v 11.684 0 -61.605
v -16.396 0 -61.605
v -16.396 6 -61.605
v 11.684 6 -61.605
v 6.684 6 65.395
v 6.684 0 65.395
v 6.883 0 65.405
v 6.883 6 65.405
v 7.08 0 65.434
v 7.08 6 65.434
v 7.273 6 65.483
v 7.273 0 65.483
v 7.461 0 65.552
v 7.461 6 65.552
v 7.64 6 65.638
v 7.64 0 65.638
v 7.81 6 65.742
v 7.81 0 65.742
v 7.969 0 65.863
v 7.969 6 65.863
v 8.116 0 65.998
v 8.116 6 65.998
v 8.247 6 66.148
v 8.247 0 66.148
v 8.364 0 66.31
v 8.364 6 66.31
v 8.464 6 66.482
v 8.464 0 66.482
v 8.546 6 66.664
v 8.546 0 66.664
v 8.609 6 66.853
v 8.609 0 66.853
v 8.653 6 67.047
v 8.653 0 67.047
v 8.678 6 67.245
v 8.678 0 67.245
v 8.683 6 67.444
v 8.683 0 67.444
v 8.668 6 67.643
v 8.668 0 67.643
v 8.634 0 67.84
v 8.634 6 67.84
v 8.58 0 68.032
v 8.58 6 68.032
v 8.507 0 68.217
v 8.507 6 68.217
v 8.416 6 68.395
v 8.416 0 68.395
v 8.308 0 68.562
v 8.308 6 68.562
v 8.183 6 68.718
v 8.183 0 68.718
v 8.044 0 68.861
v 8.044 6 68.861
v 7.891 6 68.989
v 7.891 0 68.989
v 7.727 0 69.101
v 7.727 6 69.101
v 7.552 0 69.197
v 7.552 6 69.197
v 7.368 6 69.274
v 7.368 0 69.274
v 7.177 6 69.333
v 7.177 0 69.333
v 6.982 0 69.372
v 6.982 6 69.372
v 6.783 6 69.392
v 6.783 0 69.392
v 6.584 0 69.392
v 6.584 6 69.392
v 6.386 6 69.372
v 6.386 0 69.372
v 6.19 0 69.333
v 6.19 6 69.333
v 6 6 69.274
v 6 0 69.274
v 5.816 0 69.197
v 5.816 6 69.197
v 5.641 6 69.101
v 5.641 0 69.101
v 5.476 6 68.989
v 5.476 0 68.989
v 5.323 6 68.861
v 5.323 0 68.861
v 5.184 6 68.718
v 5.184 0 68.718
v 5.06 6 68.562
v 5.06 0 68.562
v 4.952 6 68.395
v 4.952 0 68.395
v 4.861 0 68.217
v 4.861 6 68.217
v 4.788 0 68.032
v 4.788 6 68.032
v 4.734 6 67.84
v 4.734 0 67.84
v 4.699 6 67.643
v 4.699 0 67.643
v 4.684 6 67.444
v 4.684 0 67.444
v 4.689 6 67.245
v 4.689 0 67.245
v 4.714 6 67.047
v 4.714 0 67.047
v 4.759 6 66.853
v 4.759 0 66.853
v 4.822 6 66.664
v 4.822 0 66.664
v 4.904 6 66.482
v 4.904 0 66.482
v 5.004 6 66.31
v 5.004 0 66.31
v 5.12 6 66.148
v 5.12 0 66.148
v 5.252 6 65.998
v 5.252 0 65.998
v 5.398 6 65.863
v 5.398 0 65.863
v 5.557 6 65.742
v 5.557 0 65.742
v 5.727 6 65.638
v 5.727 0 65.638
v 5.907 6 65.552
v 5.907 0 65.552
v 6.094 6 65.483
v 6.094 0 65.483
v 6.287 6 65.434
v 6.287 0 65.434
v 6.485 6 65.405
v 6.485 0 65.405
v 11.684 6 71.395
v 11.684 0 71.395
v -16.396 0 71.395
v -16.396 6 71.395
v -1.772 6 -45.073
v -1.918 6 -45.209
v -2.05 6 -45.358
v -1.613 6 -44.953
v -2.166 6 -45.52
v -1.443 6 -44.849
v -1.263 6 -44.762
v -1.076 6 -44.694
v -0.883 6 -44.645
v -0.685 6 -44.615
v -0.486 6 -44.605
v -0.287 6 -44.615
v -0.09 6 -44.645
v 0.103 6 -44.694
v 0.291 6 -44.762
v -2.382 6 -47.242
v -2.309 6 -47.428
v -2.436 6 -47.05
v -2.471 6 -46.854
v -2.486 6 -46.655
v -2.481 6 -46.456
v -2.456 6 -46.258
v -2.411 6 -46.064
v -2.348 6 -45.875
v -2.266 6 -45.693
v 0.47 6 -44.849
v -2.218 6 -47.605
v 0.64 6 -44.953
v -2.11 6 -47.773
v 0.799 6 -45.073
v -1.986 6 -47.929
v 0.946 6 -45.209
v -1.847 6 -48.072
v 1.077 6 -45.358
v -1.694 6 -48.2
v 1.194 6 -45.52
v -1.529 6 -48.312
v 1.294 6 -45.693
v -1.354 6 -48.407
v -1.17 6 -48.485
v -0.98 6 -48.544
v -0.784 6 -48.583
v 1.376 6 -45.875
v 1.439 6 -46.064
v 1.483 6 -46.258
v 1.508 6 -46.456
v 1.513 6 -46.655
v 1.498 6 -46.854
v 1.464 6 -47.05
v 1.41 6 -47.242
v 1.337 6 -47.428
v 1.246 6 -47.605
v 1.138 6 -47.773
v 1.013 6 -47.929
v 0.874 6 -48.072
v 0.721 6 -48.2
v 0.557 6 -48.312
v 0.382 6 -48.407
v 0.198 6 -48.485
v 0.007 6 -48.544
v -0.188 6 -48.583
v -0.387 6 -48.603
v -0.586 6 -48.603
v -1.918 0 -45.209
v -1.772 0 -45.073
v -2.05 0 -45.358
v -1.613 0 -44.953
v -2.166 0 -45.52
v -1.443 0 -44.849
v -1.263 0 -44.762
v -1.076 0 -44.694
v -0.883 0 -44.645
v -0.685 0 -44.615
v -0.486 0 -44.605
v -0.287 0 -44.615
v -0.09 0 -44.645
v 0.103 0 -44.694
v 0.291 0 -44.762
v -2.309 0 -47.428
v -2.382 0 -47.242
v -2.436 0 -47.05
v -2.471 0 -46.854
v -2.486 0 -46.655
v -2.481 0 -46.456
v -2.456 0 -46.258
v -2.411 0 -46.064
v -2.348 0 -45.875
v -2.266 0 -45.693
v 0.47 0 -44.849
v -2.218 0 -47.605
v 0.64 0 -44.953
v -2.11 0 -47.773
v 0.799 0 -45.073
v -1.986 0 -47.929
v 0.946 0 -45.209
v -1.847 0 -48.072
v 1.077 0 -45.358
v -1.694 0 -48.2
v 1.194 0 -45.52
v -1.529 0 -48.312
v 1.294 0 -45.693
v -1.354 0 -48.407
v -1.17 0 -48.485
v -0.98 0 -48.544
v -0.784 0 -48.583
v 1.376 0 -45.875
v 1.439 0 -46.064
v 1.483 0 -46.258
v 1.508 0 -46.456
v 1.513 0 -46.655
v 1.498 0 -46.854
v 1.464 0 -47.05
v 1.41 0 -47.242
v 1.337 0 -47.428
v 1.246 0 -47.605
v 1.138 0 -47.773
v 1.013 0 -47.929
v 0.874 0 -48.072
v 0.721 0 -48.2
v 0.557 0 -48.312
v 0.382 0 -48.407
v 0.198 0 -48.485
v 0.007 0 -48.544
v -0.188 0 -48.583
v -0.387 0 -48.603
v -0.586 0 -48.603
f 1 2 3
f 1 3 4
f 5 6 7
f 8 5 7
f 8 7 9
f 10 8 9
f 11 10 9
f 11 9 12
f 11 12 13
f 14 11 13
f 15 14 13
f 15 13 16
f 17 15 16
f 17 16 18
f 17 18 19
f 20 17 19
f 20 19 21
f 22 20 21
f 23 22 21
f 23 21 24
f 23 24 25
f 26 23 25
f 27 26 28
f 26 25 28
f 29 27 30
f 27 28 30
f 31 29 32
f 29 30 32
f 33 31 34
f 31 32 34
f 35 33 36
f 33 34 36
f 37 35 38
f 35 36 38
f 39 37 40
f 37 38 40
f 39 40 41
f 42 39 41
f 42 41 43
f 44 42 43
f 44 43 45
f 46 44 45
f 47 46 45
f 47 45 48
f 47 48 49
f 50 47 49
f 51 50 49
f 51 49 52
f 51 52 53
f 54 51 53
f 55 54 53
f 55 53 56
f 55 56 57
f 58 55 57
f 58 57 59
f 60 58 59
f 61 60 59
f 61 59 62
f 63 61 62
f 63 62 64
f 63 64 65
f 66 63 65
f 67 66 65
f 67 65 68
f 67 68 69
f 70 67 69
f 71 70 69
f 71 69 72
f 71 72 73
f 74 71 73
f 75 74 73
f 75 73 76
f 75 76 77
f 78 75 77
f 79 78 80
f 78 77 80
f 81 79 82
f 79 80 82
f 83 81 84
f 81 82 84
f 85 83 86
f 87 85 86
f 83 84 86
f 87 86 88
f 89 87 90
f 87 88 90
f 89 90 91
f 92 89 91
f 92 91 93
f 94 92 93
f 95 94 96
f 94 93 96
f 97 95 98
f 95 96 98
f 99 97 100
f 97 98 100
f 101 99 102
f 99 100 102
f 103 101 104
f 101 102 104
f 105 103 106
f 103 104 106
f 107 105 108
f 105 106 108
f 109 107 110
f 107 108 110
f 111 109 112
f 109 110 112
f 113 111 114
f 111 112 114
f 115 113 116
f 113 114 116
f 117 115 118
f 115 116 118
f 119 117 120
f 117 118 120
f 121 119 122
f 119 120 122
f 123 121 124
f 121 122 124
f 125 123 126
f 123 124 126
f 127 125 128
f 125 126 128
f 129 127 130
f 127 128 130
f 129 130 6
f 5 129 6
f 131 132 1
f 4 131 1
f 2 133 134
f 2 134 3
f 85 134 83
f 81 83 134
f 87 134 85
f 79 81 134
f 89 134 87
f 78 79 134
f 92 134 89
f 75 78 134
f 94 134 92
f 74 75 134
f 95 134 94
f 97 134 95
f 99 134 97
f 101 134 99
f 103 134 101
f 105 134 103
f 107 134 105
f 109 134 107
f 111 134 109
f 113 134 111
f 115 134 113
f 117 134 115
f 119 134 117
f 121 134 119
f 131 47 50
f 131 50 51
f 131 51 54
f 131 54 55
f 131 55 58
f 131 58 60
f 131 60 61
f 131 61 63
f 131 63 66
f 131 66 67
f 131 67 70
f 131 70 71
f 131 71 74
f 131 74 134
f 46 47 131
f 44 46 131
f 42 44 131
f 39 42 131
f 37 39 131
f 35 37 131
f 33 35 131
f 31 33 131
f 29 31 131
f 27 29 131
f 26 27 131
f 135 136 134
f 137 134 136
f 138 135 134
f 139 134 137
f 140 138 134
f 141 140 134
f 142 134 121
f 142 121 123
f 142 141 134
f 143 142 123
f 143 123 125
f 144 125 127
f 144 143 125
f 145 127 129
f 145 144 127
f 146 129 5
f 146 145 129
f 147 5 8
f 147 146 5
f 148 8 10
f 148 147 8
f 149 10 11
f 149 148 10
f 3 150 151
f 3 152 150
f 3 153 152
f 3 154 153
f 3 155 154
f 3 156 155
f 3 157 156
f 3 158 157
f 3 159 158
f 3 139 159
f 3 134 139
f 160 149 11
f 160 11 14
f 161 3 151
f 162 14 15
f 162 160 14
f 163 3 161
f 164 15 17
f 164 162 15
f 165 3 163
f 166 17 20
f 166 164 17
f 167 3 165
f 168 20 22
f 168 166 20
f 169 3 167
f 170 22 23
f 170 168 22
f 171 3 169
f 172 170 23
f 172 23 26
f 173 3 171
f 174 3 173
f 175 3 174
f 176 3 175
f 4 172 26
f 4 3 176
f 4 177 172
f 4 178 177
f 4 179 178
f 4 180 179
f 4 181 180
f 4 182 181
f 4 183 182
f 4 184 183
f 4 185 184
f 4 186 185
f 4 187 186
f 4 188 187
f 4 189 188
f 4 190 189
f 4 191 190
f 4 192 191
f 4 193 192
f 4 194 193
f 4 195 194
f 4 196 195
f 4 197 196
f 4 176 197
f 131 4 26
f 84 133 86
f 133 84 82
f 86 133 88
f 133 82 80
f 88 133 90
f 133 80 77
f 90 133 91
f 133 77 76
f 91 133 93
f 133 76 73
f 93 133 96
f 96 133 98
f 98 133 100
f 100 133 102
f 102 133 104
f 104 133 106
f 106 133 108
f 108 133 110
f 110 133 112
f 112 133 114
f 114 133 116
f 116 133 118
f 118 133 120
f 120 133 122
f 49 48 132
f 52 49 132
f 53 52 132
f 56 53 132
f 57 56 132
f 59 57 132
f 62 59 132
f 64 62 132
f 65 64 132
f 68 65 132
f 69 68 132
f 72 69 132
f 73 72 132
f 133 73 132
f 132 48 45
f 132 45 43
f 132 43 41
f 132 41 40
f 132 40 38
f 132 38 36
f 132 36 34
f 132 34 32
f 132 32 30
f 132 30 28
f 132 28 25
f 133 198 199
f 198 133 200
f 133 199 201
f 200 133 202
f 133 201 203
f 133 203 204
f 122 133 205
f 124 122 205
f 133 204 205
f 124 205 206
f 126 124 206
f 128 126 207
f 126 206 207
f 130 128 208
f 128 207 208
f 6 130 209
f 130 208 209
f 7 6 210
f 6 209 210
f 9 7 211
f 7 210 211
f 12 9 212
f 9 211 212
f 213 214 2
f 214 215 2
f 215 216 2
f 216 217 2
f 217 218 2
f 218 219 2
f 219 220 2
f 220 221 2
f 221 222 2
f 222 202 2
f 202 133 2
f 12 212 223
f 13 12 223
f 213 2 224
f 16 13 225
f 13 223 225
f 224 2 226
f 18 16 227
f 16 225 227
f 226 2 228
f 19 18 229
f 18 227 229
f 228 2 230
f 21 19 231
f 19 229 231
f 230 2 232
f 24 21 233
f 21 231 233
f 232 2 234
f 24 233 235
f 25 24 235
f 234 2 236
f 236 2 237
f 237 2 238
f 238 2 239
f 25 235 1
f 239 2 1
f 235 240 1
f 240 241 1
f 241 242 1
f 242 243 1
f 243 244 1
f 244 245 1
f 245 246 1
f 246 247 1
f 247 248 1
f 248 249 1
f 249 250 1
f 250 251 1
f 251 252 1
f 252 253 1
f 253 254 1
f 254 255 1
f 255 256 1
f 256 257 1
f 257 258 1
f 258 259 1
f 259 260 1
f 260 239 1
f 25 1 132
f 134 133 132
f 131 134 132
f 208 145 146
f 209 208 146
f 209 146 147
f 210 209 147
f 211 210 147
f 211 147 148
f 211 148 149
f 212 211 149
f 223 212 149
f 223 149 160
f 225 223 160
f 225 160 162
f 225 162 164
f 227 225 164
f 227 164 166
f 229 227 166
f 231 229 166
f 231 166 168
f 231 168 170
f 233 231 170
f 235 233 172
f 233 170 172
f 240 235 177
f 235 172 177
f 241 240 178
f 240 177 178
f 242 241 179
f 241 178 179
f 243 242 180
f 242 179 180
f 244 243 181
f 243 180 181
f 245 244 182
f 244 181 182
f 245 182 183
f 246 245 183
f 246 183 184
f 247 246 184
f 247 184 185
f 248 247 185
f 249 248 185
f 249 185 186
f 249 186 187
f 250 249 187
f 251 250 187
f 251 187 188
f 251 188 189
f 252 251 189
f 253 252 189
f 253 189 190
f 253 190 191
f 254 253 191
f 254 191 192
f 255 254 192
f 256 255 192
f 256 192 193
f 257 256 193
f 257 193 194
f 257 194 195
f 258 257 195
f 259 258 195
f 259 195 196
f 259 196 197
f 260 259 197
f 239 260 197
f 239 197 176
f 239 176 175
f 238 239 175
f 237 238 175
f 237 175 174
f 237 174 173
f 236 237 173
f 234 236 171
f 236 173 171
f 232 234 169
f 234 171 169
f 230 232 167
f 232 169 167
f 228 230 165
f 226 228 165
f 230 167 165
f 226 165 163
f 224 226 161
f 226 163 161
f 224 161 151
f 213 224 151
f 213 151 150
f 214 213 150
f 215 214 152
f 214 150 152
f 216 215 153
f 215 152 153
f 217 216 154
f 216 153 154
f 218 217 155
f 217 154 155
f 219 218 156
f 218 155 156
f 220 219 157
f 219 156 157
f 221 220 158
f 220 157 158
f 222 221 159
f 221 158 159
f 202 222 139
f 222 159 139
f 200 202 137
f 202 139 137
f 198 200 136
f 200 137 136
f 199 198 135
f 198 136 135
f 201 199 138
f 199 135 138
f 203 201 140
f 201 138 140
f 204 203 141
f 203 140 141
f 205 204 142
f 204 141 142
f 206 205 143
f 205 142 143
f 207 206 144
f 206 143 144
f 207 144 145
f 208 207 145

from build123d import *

# Parameters (mm, degrees)
SKETCH1_W           = 28.08
SKETCH1_H           = 133
BOSS_EXTRUDE1_DEPTH = 6
SKETCH2_R           = 2
CUT_EXTRUDE1_DEPTH  = 74.498462865
SKETCH3_R           = 2
CUT_EXTRUDE2_DEPTH  = 74.498462865


with BuildPart() as part:
    # Sketch1 → Boss-Extrude1 (new body)
    with BuildSketch(Plane(origin=(0, 0, 0), x_dir=(1, 0, 0), z_dir=(0, 1, 0))):
        with Locations((-2.356216216, -4.894594595)):
            Rectangle(SKETCH1_W, SKETCH1_H)
    extrude(amount=BOSS_EXTRUDE1_DEPTH)

    # Sketch2 → Cut-Extrude1 (cut, through all)
    with BuildSketch(Plane(origin=(0, 6, 0), x_dir=(1, 0, 0), z_dir=(0, 1, 0))):
        with Locations(Location((-0.486216216, 46.605405405, 0), (0, 0, 270))):
            Circle(SKETCH2_R)
    extrude(amount=-CUT_EXTRUDE1_DEPTH, mode=Mode.SUBTRACT)

    # Sketch3 → Cut-Extrude2 (cut, through all)
    with BuildSketch(Plane.XZ):
        with Locations(Location((6.683783784, 67.394594595, 0), (0, 0, 270))):
            Circle(SKETCH3_R)
    extrude(amount=-CUT_EXTRUDE2_DEPTH, mode=Mode.SUBTRACT)


solid = part.part
